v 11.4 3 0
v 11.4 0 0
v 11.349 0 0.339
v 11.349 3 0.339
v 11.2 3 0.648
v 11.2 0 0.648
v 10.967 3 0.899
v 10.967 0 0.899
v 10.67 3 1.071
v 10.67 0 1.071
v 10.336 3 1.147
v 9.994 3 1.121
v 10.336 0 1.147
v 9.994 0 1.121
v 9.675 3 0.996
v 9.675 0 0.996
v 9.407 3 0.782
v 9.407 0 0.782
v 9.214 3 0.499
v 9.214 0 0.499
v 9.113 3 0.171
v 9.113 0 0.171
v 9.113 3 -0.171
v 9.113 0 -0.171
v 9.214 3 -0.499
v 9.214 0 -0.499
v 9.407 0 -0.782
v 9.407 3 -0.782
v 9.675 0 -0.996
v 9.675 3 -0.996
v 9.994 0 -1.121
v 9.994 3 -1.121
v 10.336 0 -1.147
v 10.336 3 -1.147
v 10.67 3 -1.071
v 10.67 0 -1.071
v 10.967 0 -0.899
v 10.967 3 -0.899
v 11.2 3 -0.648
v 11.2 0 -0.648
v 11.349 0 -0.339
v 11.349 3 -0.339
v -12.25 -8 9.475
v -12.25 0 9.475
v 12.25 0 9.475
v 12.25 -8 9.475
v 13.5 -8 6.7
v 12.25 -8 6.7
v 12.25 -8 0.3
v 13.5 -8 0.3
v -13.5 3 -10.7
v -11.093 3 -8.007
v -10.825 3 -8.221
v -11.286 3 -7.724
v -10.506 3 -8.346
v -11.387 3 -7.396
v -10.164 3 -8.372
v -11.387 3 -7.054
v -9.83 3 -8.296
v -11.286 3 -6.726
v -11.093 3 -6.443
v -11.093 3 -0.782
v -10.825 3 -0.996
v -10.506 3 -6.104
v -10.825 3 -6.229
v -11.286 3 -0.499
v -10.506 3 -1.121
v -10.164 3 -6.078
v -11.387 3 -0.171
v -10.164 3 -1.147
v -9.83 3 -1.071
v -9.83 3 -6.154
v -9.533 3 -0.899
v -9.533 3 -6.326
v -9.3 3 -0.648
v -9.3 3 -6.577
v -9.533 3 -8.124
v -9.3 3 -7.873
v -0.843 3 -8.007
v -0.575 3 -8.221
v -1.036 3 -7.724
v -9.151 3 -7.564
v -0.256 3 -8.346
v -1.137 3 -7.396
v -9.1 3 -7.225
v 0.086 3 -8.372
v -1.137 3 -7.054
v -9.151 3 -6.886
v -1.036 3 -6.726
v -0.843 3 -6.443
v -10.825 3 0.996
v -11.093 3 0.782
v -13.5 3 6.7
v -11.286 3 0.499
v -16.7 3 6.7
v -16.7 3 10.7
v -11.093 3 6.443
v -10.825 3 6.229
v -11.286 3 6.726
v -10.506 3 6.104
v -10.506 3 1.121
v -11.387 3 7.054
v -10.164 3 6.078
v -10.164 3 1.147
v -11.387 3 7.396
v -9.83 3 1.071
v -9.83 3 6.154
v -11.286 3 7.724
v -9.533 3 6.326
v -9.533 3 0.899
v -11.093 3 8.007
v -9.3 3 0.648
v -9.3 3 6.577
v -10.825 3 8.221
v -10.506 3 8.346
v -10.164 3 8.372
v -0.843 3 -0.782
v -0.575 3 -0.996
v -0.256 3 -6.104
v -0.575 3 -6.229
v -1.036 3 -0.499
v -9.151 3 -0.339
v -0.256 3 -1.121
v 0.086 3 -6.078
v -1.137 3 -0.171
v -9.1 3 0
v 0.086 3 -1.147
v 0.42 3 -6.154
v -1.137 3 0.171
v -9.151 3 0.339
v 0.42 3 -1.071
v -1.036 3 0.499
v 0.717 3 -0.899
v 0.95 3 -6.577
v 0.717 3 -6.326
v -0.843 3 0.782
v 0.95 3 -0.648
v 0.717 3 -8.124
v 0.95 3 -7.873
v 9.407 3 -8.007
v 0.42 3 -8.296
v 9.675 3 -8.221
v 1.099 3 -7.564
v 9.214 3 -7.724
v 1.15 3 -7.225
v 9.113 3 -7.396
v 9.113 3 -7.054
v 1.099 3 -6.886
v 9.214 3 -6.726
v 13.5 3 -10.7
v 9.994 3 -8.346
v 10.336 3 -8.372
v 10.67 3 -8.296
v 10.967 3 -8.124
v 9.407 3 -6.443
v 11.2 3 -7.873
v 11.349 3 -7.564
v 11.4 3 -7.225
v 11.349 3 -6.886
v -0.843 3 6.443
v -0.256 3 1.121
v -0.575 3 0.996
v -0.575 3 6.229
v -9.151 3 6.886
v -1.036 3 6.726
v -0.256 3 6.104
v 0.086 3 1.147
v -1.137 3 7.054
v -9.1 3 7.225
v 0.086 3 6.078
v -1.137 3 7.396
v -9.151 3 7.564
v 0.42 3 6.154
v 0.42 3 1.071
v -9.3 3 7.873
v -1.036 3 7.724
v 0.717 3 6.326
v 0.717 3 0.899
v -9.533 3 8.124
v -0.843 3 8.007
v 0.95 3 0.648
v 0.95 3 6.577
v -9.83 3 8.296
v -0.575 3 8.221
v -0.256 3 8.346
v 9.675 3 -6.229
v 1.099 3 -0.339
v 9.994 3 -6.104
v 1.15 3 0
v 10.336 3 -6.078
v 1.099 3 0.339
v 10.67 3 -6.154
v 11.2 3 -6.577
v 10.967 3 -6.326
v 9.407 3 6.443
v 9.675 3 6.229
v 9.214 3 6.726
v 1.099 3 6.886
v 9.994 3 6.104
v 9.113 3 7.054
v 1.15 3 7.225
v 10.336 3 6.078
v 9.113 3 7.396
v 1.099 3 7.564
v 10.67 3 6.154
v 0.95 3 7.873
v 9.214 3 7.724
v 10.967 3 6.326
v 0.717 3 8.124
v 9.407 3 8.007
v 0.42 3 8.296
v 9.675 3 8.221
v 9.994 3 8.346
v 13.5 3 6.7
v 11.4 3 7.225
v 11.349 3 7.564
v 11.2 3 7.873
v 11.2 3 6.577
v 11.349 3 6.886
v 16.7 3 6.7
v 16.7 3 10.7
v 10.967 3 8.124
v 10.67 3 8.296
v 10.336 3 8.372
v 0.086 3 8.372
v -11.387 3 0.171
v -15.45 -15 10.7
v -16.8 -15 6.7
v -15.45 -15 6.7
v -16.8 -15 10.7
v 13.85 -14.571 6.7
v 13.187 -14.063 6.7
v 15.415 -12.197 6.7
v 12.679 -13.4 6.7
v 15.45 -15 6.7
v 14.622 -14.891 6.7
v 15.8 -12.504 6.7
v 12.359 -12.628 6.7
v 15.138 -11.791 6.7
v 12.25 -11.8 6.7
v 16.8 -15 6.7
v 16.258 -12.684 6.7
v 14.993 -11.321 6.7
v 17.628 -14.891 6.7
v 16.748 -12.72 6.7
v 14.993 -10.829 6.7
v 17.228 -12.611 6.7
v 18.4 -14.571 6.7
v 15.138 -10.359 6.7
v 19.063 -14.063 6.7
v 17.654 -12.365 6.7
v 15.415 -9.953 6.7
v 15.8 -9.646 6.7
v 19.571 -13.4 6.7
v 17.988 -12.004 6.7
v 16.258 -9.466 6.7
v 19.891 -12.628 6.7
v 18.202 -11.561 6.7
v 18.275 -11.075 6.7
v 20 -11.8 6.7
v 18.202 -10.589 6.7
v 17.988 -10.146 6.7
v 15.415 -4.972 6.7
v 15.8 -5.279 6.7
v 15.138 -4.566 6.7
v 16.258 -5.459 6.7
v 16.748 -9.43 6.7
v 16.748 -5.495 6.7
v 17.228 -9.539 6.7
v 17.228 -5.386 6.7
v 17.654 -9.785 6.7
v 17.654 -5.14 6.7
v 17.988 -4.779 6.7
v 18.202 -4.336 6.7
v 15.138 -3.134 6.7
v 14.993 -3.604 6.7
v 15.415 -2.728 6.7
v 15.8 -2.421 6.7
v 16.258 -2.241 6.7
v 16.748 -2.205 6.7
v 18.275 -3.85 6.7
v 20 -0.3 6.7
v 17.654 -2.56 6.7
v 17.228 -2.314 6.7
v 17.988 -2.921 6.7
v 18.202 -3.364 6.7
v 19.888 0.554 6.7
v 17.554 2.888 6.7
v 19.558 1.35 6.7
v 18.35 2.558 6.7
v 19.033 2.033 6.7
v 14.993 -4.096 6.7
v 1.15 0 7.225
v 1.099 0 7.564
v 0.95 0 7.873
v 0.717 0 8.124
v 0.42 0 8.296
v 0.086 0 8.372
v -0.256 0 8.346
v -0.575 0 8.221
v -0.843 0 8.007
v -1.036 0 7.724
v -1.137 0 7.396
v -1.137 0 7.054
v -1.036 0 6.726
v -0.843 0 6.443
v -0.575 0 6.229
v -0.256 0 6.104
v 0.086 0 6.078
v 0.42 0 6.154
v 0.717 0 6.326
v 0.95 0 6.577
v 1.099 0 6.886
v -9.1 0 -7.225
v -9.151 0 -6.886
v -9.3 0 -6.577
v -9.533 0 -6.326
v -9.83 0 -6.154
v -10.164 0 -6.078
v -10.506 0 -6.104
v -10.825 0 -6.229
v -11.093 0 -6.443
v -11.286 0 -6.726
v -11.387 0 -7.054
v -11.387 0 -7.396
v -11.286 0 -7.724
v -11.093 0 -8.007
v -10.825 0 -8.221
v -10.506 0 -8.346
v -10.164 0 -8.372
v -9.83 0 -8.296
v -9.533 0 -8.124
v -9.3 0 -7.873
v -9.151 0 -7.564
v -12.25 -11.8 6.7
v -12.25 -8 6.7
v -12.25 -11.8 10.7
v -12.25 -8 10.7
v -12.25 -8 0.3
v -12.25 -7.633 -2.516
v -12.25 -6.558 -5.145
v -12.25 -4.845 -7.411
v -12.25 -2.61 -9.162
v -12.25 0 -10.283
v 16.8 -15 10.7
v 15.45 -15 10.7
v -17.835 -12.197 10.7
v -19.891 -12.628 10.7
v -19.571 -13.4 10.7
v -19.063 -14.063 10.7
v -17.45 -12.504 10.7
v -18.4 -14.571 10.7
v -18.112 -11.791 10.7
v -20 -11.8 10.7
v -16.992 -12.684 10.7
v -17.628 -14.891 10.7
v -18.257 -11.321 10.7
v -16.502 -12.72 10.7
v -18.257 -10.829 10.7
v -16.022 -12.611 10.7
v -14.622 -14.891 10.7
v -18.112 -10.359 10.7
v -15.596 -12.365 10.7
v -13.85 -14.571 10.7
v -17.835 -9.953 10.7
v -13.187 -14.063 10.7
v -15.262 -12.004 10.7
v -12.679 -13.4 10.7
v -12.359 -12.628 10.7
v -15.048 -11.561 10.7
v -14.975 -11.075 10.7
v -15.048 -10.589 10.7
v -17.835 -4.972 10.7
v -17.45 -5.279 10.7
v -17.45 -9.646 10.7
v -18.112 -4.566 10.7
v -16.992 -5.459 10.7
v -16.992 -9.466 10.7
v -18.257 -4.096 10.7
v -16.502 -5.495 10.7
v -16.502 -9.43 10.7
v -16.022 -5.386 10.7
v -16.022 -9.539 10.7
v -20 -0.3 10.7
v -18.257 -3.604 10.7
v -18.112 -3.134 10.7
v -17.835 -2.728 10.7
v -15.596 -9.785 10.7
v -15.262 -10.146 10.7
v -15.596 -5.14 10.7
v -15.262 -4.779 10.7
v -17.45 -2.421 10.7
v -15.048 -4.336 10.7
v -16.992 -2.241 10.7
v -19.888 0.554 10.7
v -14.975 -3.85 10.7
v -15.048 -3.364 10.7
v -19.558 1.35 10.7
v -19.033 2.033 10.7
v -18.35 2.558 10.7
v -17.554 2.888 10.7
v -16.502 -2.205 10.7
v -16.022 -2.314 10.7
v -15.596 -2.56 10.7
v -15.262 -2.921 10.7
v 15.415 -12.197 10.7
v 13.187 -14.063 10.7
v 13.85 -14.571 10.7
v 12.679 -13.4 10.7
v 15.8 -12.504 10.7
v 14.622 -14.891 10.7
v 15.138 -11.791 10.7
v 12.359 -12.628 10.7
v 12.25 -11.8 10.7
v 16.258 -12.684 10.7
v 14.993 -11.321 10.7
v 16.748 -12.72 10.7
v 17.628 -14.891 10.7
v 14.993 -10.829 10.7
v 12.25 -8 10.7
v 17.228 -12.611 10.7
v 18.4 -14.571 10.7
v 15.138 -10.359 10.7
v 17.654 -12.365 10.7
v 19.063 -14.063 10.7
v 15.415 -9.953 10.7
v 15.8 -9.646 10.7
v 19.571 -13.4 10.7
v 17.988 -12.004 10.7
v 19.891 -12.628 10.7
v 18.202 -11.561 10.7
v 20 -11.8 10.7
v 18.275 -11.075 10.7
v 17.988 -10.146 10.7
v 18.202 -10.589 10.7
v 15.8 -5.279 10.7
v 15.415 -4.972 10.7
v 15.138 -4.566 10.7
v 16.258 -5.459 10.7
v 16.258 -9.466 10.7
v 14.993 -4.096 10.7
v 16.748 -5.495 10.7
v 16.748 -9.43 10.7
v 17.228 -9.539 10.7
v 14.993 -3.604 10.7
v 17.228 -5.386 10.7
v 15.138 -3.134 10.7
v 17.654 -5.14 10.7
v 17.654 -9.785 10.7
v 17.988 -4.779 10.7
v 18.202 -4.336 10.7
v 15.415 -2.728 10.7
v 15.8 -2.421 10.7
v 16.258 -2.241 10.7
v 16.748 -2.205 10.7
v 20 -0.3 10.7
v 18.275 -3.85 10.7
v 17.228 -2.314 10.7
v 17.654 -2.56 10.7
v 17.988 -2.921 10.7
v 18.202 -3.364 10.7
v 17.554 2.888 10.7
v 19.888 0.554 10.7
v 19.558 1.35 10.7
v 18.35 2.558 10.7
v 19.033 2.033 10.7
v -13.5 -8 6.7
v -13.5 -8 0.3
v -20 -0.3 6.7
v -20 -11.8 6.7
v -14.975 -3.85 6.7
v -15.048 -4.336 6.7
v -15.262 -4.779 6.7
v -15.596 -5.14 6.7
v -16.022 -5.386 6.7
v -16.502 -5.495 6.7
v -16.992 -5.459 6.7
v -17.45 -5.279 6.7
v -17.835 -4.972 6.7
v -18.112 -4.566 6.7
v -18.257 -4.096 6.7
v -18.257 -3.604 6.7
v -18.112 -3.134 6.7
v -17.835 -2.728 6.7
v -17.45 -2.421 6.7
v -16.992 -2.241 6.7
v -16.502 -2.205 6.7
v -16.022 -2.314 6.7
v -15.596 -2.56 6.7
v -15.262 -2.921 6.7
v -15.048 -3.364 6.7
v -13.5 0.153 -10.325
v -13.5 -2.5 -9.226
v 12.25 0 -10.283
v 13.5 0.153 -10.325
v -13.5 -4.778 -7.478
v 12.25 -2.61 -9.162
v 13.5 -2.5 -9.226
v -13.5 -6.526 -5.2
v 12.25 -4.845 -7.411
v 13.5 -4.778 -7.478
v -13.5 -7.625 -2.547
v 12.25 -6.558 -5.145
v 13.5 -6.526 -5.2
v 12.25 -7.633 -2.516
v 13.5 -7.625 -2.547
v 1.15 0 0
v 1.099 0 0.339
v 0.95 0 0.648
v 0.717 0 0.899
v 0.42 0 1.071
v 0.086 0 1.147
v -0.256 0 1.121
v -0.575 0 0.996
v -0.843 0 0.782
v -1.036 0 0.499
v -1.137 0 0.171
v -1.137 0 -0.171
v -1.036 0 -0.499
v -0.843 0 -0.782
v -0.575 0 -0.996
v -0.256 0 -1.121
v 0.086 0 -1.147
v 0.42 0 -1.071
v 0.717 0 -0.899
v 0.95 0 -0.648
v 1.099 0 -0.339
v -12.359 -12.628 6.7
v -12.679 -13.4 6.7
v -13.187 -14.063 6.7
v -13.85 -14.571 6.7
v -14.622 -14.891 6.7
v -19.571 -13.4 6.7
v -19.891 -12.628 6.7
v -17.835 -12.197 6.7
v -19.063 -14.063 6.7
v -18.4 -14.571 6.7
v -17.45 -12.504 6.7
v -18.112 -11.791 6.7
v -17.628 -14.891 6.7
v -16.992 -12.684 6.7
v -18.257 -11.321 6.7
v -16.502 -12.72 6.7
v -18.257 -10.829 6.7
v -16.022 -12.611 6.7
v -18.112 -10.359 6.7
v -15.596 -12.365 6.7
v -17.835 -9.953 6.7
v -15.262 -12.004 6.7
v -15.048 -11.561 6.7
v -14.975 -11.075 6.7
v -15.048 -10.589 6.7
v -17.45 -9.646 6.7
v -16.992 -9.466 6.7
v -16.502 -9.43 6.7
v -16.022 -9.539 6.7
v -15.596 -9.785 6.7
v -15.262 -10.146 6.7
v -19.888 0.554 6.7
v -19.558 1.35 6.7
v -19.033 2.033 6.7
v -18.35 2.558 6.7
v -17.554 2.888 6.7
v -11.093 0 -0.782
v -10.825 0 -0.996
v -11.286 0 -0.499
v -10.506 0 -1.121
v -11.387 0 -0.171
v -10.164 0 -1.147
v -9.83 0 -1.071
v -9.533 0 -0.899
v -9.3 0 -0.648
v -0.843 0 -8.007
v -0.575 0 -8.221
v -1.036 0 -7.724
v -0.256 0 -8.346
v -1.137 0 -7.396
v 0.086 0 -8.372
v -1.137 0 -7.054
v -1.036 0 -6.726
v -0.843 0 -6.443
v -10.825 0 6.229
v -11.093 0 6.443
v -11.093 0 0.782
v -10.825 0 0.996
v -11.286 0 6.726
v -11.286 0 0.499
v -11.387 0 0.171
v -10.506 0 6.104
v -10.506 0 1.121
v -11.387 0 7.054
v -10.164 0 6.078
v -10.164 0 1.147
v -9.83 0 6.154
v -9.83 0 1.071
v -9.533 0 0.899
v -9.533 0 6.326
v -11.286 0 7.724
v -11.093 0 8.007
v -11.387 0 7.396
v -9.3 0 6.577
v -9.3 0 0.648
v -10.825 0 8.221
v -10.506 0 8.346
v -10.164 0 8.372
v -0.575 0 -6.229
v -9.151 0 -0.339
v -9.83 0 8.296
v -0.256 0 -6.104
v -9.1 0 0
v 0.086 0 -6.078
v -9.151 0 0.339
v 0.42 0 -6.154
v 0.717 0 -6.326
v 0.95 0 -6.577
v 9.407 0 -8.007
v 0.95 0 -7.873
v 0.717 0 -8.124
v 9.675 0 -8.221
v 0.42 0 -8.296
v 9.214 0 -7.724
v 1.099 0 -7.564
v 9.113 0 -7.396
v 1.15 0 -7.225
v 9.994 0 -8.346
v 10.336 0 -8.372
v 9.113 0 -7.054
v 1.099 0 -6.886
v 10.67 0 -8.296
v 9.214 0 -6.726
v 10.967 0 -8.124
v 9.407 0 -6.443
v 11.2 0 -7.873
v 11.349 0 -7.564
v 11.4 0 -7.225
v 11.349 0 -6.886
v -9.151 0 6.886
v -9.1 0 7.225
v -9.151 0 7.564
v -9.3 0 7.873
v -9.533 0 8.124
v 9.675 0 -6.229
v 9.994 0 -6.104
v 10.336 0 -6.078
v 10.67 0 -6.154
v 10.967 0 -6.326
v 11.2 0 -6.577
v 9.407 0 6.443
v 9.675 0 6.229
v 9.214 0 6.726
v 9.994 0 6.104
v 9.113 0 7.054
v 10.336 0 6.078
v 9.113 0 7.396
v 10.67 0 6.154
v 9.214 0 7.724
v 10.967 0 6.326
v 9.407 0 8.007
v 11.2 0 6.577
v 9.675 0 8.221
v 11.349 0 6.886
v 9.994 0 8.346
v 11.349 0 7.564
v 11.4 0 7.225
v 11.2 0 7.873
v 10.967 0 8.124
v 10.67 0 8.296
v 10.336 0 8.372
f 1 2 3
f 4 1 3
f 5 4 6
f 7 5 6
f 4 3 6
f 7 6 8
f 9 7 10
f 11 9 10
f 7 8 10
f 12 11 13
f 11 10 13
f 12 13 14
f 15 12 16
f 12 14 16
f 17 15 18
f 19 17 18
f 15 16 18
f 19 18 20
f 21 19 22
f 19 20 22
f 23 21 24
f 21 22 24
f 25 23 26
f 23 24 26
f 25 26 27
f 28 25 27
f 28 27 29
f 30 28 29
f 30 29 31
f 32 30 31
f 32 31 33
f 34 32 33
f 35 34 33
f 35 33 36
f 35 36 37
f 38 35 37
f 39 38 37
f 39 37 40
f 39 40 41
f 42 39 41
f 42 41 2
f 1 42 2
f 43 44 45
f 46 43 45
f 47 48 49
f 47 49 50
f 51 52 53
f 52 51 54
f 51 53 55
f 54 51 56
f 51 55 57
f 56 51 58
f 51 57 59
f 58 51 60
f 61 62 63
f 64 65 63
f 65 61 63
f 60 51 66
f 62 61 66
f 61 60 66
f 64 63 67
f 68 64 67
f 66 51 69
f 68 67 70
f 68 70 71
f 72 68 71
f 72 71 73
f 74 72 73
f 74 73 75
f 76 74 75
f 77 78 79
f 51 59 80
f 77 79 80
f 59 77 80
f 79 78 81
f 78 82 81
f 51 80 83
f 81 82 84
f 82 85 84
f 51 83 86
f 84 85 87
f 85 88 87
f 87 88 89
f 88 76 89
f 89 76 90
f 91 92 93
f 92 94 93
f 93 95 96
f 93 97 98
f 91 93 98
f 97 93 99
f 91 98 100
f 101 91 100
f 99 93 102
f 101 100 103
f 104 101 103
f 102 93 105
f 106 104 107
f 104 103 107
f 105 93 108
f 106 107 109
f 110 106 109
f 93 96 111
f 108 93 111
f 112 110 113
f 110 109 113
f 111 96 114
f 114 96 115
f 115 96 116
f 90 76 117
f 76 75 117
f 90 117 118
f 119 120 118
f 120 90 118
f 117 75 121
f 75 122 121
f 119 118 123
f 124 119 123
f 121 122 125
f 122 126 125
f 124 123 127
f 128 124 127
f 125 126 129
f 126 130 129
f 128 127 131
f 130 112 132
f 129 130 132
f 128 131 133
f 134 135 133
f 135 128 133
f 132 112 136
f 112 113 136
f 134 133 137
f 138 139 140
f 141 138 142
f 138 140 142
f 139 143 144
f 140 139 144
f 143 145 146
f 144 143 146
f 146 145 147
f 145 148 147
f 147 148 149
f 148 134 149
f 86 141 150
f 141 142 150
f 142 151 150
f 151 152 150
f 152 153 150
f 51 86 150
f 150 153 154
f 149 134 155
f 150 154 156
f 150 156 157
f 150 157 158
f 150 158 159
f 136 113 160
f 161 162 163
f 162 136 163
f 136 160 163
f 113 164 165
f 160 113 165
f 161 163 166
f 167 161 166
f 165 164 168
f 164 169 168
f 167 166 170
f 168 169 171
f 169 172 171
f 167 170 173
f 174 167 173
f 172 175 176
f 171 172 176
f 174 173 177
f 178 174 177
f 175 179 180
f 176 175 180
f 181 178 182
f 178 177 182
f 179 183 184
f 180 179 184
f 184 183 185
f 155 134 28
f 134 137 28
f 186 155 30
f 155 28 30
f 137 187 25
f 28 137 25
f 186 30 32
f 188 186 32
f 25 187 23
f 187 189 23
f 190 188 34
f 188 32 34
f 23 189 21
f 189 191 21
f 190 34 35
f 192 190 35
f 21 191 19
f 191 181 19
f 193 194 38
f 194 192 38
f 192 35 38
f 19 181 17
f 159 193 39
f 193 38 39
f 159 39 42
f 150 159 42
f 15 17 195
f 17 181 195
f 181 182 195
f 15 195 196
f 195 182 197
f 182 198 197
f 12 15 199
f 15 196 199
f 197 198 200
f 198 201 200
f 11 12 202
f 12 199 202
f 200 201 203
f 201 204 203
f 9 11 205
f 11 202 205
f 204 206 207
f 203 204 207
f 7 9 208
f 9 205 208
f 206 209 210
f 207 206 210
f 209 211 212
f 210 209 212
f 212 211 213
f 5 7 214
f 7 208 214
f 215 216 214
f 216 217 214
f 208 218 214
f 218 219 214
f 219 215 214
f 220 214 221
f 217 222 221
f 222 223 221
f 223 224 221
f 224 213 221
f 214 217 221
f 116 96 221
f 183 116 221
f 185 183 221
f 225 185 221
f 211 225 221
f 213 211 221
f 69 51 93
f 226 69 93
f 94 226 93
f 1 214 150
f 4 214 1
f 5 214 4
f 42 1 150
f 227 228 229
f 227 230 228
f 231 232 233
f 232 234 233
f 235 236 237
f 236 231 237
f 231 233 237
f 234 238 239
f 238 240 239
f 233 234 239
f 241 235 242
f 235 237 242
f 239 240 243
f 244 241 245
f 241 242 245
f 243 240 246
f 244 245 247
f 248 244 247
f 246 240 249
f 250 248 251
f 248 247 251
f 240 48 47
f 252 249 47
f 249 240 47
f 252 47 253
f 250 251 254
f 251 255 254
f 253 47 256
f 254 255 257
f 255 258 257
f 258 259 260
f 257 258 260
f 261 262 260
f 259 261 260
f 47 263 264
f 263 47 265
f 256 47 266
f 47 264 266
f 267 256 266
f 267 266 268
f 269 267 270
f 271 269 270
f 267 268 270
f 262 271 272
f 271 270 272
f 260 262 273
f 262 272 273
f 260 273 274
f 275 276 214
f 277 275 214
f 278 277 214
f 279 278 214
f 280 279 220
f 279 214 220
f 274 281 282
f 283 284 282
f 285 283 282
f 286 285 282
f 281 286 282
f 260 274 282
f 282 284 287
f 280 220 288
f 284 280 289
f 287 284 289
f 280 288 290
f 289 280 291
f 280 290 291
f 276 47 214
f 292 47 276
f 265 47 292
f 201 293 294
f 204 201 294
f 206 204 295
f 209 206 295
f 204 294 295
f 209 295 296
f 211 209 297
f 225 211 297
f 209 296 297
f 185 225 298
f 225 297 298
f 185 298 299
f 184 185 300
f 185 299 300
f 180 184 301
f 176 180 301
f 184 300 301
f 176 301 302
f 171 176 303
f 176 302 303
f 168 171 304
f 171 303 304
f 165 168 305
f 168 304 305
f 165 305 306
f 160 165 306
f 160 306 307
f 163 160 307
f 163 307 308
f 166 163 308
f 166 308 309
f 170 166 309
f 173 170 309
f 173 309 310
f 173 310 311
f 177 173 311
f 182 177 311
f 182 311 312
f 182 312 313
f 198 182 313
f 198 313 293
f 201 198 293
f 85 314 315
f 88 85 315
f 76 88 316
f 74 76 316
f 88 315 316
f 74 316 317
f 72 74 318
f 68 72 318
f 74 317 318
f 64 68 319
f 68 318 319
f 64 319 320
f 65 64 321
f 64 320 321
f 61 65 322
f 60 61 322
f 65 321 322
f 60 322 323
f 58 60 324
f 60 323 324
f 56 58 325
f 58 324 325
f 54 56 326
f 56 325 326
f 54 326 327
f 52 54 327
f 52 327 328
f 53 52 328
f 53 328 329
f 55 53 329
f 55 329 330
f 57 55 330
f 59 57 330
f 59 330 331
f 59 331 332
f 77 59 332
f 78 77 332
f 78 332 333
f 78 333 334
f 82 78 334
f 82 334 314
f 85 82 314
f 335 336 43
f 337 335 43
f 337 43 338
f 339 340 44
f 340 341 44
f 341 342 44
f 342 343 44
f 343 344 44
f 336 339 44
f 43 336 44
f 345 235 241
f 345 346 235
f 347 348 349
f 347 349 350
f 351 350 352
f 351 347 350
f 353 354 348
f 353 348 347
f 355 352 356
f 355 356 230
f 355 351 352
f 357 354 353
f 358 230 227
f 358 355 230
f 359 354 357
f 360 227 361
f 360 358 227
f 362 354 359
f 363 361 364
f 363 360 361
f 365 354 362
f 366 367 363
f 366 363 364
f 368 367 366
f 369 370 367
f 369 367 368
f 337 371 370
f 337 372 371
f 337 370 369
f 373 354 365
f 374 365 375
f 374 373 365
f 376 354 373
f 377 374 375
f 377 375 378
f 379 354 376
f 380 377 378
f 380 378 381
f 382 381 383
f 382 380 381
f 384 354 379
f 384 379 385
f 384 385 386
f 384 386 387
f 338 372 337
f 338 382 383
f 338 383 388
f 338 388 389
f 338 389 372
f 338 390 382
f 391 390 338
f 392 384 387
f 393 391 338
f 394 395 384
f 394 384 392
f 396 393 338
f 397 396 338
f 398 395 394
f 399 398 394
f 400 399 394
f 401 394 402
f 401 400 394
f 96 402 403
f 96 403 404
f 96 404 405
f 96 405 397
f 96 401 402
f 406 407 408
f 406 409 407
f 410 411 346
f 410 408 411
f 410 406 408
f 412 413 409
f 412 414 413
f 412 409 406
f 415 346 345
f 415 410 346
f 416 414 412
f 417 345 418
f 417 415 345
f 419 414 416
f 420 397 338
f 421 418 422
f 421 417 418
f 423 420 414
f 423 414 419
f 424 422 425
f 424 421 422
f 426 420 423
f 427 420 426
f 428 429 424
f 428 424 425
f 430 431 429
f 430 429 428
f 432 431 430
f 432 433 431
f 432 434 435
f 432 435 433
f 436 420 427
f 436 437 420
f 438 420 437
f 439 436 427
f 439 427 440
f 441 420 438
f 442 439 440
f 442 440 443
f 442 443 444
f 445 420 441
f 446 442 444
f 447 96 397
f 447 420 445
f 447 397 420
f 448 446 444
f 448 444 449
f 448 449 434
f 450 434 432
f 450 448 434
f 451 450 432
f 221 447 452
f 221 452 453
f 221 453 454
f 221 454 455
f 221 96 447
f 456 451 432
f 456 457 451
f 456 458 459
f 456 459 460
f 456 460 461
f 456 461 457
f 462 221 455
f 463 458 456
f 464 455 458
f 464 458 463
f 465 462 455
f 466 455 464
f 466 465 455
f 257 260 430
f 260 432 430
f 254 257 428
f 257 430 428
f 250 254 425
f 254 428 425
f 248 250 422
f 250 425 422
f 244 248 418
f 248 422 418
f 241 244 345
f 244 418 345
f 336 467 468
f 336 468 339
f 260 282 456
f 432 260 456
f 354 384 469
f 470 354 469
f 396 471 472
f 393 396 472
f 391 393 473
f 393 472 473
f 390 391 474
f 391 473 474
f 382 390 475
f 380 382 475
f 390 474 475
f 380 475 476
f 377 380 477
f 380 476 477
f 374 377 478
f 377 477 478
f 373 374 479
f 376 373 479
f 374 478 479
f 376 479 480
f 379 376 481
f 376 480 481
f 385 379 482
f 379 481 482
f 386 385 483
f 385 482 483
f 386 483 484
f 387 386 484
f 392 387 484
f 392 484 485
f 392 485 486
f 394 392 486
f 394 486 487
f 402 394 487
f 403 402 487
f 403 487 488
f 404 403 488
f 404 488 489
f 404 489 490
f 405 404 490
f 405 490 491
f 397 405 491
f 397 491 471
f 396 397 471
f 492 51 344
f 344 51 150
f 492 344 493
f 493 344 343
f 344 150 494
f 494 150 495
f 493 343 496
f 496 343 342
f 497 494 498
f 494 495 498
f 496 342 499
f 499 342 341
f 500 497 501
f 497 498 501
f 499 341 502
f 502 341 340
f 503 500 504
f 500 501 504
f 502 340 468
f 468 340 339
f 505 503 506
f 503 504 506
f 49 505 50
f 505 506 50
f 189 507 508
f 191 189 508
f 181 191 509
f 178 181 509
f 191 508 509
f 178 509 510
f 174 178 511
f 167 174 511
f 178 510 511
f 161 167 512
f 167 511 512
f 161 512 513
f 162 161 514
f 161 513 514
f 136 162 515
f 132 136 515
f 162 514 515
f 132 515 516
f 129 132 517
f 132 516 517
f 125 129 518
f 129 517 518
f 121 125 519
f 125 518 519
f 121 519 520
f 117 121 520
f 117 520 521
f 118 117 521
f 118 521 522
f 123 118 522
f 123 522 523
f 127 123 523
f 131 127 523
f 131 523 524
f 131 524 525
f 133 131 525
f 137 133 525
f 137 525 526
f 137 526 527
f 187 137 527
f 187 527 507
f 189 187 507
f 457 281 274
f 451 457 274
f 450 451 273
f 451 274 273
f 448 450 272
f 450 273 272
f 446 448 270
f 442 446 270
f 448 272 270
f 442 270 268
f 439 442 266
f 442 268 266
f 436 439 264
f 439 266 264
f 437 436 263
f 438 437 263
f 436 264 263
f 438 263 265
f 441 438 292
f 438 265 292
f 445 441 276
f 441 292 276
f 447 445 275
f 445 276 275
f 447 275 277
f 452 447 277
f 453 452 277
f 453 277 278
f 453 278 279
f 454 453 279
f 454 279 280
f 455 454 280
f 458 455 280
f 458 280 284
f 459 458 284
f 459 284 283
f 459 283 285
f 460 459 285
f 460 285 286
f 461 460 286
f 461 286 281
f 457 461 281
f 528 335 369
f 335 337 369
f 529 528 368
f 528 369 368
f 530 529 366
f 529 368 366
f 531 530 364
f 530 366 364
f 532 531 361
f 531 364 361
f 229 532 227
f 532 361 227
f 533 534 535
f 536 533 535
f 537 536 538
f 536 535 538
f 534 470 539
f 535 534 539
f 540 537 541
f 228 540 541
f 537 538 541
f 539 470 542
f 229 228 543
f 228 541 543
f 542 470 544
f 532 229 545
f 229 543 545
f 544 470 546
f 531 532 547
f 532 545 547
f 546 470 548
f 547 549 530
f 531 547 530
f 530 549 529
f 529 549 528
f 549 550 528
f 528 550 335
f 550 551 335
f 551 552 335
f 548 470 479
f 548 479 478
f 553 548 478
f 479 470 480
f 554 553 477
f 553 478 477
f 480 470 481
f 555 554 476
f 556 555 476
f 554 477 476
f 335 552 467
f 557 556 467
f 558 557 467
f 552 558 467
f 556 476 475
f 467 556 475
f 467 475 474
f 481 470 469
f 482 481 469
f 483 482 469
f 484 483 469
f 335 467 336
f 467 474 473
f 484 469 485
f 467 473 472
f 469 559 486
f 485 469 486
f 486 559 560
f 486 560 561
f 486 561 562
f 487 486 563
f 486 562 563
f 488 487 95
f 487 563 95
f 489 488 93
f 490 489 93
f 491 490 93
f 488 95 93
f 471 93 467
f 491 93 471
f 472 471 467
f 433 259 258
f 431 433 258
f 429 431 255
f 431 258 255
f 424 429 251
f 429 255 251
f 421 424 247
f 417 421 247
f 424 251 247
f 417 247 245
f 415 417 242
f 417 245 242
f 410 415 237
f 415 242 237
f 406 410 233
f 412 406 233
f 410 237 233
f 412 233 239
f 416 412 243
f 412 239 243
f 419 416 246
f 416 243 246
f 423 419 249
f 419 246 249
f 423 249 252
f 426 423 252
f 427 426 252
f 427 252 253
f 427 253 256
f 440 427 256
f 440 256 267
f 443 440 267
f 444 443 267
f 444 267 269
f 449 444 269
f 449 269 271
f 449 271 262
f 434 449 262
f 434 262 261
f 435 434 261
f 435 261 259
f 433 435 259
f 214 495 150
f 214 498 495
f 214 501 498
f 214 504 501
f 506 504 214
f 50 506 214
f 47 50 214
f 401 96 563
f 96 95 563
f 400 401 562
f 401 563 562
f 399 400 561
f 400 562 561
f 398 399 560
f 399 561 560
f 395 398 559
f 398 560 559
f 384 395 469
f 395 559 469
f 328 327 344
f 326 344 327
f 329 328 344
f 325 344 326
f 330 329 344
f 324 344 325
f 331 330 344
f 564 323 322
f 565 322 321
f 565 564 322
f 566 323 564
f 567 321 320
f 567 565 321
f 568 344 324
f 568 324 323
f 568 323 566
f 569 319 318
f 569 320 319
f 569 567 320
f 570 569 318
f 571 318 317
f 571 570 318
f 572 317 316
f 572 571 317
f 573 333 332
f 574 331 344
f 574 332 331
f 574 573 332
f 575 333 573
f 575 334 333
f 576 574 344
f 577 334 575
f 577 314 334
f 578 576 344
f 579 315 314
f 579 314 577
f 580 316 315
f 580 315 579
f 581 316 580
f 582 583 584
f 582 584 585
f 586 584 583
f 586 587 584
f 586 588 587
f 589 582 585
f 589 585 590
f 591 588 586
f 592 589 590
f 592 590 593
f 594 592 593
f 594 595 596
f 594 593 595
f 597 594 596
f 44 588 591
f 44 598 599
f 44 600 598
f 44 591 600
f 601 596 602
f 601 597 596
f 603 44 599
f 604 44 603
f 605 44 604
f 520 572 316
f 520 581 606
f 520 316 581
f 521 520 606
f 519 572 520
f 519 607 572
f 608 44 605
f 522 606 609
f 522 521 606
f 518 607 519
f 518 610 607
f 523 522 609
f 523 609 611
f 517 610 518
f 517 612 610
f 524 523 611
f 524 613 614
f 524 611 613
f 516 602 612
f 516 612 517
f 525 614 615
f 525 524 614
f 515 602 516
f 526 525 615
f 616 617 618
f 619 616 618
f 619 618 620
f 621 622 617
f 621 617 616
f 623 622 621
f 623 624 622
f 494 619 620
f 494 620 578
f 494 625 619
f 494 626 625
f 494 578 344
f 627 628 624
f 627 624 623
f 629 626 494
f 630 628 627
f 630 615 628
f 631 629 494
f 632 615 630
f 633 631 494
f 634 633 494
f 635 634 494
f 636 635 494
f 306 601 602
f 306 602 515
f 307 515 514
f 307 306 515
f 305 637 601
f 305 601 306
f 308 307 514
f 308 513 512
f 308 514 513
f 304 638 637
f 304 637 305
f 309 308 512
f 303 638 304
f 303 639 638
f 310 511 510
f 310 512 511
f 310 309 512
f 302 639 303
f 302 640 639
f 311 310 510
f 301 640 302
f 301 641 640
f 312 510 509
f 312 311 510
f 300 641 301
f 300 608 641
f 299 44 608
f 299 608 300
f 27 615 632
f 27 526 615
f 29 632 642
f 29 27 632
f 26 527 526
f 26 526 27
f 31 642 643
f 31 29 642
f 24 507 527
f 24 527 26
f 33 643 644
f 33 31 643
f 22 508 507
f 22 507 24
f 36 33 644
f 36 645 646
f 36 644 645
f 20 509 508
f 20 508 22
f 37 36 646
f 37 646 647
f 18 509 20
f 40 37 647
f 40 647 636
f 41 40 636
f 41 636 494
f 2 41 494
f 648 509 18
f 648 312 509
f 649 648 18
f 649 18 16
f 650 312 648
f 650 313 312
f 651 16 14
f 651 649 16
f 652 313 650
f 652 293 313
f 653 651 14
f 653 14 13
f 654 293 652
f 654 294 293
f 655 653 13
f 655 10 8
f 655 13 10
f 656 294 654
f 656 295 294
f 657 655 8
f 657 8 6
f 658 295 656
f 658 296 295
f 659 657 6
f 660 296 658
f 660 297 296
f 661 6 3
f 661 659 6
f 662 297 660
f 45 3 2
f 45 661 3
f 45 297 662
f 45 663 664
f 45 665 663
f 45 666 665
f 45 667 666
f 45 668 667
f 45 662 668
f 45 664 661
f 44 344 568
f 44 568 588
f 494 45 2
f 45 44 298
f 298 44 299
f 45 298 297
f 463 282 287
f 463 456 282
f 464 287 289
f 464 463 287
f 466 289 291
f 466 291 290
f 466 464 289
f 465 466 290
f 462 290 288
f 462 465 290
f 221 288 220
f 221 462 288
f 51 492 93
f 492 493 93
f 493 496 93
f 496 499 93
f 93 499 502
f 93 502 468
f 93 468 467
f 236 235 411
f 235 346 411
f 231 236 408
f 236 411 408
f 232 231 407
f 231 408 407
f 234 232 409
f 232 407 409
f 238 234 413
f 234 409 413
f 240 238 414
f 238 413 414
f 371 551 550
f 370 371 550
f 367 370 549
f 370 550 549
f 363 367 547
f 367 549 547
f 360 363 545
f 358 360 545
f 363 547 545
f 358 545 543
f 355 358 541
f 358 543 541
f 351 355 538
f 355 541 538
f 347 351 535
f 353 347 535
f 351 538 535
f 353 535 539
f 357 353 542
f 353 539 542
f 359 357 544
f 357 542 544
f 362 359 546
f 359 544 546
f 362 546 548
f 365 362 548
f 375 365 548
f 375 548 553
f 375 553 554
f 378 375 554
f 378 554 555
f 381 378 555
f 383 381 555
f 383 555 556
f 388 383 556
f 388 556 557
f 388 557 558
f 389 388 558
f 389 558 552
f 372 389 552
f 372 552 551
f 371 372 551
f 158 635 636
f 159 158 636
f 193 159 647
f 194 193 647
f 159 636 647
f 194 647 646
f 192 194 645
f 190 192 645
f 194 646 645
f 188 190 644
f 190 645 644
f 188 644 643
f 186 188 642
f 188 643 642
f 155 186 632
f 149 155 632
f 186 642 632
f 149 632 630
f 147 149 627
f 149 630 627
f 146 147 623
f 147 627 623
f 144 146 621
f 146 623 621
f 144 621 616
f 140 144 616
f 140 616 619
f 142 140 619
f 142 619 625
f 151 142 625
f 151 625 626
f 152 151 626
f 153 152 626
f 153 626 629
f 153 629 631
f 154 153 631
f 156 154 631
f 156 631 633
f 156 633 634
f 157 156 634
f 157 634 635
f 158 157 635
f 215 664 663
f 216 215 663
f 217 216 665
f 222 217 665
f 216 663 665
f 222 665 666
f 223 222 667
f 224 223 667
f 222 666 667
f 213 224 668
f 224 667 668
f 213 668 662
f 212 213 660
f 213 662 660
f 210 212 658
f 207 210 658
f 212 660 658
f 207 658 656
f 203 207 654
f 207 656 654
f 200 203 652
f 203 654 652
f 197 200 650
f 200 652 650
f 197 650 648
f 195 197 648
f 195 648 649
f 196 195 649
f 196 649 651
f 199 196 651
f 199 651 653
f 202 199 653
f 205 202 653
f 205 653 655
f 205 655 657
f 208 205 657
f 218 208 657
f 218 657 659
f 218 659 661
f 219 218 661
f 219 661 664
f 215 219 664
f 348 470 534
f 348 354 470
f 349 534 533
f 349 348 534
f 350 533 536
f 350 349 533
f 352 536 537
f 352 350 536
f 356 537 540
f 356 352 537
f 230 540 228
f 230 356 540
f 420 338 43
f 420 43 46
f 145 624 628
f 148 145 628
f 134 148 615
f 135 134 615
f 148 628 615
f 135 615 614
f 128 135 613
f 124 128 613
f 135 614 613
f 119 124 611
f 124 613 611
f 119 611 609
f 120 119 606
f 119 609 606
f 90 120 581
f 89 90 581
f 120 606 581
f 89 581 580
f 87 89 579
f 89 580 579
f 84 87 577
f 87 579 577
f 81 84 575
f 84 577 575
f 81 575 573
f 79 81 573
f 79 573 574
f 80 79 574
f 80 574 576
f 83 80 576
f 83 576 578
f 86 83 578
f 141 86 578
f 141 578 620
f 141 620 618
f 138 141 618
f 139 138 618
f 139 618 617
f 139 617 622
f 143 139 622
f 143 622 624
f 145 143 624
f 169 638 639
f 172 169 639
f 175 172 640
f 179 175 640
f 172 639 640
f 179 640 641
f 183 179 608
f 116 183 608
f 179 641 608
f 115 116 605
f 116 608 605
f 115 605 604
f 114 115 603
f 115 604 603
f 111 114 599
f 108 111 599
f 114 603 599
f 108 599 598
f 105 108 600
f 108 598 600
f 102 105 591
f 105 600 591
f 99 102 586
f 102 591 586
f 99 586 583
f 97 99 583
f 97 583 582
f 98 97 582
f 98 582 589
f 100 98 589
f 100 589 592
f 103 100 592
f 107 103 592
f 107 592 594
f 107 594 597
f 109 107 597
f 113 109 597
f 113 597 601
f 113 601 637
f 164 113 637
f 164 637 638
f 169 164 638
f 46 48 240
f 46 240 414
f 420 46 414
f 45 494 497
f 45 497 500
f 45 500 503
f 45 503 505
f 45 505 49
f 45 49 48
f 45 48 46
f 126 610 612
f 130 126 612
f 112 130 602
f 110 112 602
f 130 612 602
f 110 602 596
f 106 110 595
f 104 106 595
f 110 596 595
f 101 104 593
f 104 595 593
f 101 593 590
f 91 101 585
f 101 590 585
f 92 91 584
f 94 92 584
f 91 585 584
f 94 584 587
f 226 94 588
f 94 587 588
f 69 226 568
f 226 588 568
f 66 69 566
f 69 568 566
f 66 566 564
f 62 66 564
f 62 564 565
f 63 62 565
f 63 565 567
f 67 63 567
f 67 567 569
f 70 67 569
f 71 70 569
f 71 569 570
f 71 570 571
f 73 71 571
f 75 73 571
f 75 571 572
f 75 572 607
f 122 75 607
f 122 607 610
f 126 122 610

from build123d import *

# Parameters (mm, degrees)
F0_W          = 27
F0_H          = 21.4
F1_DEPTH      = 3
F2_R          = 1.15
F3_DEPTH      = 3.001
F5_DEPTH      = 8
F5_DEPTH_BACK = 3
F6_W          = 7.75
F6_H          = 4
F7_DEPTH      = 7
F8_R          = 1.65
F9_DEPTH      = 25
F10_F1_R      = 10.9999
F11_R         = 3.3
F12_R         = 3.2


# Not quite as in the source:
# - a fillet or chamfer is up to 0.001 mm smaller than in the source, because OpenCascade refuses the exact size


with BuildPart() as f1:
    # F0 (on Front) → F1 (new body)
    with BuildSketch(Plane.XZ):
        Rectangle(F0_W, F0_H)
    extrude(amount=-F1_DEPTH)

    # F2 (on Front) → F3 (cut, through all)
    with BuildSketch(Plane.XZ):
        with Locations((0, 7.225)):
            Circle(F2_R)
        Circle(F2_R)
        with Locations((0, -7.225)):
            Circle(F2_R)
        with Locations((10.25, 0)):
            Circle(F2_R)
        with Locations((10.25, 7.225)):
            Circle(F2_R)
        with Locations((10.25, -7.225)):
            Circle(F2_R)
        with Locations((-10.25, -7.225)):
            Circle(F2_R)
        with Locations((-10.25, 0)):
            Circle(F2_R)
        with Locations((-10.25, 7.225)):
            Circle(F2_R)
    extrude(amount=-F3_DEPTH, mode=Mode.SUBTRACT)

    # F4 (on Front) → F5 (join, two sides)
    with BuildSketch(Plane.XZ) as f5_sk:
        Polygon((20, 10.7), (0, 10.7), (-20, 10.7), (-20, 6.7), (-13.5, 6.7), (-13.5, -10.7), (-12.25, -10.7), (-12.25, 9.475), (0, 9.475), (12.25, 9.475), (12.25, -10.7), (13.5, -10.7), (13.5, 6.7), (20, 6.7), align=None)
    extrude(amount=F5_DEPTH)
    extrude(f5_sk.sketch, amount=-F5_DEPTH_BACK)

    # F6 (on face) → F7 (join)
    with BuildSketch(Plane.XZ.offset(8)):
        with Locations((16.125, 8.7)):
            Rectangle(F6_W, F6_H)
        with Locations((-16.125, 8.7)):
            Rectangle(F6_W, F6_H)
    extrude(amount=F7_DEPTH)

    # F8 (on face) → F9 (cut)
    with BuildSketch(Plane(origin=(0, 0, 6.7), x_dir=(1, 0, 0), z_dir=(0, 0, -1))):
        with Locations((-16.625, 3.85)):
            Circle(F8_R)
        with Locations((16.625, 3.85)):
            Circle(F8_R)
        with Locations((16.625, 11.075)):
            Circle(F8_R)
        with Locations((-16.625, 11.075)):
            Circle(F8_R)
    extrude(amount=-F9_DEPTH, mode=Mode.SUBTRACT)

    # F10: fillet of radius 11 on 2 edges, made by hand

    # F10_f1 (radius 11 in the source; OpenCascade refuses exactly that, so slightly less here)
    f10_f1_edges = [f1.edges().sort_by_distance(p)[0] for p in [
        (12.875, -8, -10.7),
    ]]
    fillet(f10_f1_edges, radius=F10_F1_R)

    # F11
    f11_edges = [f1.edges().sort_by_distance(p)[0] for p in [
        (20, 3, 8.7),
        (-20, 3, 8.7),
    ]]
    fillet(f11_edges, radius=F11_R)

    # F12
    f12_edges = [f1.edges().sort_by_distance(p)[0] for p in [
        (20, -15, 8.7),
        (12.25, -15, 8.7),
        (-12.25, -15, 8.7),
        (-20, -15, 8.7),
    ]]
    fillet(f12_edges, radius=F12_R)


solid = f1.part
